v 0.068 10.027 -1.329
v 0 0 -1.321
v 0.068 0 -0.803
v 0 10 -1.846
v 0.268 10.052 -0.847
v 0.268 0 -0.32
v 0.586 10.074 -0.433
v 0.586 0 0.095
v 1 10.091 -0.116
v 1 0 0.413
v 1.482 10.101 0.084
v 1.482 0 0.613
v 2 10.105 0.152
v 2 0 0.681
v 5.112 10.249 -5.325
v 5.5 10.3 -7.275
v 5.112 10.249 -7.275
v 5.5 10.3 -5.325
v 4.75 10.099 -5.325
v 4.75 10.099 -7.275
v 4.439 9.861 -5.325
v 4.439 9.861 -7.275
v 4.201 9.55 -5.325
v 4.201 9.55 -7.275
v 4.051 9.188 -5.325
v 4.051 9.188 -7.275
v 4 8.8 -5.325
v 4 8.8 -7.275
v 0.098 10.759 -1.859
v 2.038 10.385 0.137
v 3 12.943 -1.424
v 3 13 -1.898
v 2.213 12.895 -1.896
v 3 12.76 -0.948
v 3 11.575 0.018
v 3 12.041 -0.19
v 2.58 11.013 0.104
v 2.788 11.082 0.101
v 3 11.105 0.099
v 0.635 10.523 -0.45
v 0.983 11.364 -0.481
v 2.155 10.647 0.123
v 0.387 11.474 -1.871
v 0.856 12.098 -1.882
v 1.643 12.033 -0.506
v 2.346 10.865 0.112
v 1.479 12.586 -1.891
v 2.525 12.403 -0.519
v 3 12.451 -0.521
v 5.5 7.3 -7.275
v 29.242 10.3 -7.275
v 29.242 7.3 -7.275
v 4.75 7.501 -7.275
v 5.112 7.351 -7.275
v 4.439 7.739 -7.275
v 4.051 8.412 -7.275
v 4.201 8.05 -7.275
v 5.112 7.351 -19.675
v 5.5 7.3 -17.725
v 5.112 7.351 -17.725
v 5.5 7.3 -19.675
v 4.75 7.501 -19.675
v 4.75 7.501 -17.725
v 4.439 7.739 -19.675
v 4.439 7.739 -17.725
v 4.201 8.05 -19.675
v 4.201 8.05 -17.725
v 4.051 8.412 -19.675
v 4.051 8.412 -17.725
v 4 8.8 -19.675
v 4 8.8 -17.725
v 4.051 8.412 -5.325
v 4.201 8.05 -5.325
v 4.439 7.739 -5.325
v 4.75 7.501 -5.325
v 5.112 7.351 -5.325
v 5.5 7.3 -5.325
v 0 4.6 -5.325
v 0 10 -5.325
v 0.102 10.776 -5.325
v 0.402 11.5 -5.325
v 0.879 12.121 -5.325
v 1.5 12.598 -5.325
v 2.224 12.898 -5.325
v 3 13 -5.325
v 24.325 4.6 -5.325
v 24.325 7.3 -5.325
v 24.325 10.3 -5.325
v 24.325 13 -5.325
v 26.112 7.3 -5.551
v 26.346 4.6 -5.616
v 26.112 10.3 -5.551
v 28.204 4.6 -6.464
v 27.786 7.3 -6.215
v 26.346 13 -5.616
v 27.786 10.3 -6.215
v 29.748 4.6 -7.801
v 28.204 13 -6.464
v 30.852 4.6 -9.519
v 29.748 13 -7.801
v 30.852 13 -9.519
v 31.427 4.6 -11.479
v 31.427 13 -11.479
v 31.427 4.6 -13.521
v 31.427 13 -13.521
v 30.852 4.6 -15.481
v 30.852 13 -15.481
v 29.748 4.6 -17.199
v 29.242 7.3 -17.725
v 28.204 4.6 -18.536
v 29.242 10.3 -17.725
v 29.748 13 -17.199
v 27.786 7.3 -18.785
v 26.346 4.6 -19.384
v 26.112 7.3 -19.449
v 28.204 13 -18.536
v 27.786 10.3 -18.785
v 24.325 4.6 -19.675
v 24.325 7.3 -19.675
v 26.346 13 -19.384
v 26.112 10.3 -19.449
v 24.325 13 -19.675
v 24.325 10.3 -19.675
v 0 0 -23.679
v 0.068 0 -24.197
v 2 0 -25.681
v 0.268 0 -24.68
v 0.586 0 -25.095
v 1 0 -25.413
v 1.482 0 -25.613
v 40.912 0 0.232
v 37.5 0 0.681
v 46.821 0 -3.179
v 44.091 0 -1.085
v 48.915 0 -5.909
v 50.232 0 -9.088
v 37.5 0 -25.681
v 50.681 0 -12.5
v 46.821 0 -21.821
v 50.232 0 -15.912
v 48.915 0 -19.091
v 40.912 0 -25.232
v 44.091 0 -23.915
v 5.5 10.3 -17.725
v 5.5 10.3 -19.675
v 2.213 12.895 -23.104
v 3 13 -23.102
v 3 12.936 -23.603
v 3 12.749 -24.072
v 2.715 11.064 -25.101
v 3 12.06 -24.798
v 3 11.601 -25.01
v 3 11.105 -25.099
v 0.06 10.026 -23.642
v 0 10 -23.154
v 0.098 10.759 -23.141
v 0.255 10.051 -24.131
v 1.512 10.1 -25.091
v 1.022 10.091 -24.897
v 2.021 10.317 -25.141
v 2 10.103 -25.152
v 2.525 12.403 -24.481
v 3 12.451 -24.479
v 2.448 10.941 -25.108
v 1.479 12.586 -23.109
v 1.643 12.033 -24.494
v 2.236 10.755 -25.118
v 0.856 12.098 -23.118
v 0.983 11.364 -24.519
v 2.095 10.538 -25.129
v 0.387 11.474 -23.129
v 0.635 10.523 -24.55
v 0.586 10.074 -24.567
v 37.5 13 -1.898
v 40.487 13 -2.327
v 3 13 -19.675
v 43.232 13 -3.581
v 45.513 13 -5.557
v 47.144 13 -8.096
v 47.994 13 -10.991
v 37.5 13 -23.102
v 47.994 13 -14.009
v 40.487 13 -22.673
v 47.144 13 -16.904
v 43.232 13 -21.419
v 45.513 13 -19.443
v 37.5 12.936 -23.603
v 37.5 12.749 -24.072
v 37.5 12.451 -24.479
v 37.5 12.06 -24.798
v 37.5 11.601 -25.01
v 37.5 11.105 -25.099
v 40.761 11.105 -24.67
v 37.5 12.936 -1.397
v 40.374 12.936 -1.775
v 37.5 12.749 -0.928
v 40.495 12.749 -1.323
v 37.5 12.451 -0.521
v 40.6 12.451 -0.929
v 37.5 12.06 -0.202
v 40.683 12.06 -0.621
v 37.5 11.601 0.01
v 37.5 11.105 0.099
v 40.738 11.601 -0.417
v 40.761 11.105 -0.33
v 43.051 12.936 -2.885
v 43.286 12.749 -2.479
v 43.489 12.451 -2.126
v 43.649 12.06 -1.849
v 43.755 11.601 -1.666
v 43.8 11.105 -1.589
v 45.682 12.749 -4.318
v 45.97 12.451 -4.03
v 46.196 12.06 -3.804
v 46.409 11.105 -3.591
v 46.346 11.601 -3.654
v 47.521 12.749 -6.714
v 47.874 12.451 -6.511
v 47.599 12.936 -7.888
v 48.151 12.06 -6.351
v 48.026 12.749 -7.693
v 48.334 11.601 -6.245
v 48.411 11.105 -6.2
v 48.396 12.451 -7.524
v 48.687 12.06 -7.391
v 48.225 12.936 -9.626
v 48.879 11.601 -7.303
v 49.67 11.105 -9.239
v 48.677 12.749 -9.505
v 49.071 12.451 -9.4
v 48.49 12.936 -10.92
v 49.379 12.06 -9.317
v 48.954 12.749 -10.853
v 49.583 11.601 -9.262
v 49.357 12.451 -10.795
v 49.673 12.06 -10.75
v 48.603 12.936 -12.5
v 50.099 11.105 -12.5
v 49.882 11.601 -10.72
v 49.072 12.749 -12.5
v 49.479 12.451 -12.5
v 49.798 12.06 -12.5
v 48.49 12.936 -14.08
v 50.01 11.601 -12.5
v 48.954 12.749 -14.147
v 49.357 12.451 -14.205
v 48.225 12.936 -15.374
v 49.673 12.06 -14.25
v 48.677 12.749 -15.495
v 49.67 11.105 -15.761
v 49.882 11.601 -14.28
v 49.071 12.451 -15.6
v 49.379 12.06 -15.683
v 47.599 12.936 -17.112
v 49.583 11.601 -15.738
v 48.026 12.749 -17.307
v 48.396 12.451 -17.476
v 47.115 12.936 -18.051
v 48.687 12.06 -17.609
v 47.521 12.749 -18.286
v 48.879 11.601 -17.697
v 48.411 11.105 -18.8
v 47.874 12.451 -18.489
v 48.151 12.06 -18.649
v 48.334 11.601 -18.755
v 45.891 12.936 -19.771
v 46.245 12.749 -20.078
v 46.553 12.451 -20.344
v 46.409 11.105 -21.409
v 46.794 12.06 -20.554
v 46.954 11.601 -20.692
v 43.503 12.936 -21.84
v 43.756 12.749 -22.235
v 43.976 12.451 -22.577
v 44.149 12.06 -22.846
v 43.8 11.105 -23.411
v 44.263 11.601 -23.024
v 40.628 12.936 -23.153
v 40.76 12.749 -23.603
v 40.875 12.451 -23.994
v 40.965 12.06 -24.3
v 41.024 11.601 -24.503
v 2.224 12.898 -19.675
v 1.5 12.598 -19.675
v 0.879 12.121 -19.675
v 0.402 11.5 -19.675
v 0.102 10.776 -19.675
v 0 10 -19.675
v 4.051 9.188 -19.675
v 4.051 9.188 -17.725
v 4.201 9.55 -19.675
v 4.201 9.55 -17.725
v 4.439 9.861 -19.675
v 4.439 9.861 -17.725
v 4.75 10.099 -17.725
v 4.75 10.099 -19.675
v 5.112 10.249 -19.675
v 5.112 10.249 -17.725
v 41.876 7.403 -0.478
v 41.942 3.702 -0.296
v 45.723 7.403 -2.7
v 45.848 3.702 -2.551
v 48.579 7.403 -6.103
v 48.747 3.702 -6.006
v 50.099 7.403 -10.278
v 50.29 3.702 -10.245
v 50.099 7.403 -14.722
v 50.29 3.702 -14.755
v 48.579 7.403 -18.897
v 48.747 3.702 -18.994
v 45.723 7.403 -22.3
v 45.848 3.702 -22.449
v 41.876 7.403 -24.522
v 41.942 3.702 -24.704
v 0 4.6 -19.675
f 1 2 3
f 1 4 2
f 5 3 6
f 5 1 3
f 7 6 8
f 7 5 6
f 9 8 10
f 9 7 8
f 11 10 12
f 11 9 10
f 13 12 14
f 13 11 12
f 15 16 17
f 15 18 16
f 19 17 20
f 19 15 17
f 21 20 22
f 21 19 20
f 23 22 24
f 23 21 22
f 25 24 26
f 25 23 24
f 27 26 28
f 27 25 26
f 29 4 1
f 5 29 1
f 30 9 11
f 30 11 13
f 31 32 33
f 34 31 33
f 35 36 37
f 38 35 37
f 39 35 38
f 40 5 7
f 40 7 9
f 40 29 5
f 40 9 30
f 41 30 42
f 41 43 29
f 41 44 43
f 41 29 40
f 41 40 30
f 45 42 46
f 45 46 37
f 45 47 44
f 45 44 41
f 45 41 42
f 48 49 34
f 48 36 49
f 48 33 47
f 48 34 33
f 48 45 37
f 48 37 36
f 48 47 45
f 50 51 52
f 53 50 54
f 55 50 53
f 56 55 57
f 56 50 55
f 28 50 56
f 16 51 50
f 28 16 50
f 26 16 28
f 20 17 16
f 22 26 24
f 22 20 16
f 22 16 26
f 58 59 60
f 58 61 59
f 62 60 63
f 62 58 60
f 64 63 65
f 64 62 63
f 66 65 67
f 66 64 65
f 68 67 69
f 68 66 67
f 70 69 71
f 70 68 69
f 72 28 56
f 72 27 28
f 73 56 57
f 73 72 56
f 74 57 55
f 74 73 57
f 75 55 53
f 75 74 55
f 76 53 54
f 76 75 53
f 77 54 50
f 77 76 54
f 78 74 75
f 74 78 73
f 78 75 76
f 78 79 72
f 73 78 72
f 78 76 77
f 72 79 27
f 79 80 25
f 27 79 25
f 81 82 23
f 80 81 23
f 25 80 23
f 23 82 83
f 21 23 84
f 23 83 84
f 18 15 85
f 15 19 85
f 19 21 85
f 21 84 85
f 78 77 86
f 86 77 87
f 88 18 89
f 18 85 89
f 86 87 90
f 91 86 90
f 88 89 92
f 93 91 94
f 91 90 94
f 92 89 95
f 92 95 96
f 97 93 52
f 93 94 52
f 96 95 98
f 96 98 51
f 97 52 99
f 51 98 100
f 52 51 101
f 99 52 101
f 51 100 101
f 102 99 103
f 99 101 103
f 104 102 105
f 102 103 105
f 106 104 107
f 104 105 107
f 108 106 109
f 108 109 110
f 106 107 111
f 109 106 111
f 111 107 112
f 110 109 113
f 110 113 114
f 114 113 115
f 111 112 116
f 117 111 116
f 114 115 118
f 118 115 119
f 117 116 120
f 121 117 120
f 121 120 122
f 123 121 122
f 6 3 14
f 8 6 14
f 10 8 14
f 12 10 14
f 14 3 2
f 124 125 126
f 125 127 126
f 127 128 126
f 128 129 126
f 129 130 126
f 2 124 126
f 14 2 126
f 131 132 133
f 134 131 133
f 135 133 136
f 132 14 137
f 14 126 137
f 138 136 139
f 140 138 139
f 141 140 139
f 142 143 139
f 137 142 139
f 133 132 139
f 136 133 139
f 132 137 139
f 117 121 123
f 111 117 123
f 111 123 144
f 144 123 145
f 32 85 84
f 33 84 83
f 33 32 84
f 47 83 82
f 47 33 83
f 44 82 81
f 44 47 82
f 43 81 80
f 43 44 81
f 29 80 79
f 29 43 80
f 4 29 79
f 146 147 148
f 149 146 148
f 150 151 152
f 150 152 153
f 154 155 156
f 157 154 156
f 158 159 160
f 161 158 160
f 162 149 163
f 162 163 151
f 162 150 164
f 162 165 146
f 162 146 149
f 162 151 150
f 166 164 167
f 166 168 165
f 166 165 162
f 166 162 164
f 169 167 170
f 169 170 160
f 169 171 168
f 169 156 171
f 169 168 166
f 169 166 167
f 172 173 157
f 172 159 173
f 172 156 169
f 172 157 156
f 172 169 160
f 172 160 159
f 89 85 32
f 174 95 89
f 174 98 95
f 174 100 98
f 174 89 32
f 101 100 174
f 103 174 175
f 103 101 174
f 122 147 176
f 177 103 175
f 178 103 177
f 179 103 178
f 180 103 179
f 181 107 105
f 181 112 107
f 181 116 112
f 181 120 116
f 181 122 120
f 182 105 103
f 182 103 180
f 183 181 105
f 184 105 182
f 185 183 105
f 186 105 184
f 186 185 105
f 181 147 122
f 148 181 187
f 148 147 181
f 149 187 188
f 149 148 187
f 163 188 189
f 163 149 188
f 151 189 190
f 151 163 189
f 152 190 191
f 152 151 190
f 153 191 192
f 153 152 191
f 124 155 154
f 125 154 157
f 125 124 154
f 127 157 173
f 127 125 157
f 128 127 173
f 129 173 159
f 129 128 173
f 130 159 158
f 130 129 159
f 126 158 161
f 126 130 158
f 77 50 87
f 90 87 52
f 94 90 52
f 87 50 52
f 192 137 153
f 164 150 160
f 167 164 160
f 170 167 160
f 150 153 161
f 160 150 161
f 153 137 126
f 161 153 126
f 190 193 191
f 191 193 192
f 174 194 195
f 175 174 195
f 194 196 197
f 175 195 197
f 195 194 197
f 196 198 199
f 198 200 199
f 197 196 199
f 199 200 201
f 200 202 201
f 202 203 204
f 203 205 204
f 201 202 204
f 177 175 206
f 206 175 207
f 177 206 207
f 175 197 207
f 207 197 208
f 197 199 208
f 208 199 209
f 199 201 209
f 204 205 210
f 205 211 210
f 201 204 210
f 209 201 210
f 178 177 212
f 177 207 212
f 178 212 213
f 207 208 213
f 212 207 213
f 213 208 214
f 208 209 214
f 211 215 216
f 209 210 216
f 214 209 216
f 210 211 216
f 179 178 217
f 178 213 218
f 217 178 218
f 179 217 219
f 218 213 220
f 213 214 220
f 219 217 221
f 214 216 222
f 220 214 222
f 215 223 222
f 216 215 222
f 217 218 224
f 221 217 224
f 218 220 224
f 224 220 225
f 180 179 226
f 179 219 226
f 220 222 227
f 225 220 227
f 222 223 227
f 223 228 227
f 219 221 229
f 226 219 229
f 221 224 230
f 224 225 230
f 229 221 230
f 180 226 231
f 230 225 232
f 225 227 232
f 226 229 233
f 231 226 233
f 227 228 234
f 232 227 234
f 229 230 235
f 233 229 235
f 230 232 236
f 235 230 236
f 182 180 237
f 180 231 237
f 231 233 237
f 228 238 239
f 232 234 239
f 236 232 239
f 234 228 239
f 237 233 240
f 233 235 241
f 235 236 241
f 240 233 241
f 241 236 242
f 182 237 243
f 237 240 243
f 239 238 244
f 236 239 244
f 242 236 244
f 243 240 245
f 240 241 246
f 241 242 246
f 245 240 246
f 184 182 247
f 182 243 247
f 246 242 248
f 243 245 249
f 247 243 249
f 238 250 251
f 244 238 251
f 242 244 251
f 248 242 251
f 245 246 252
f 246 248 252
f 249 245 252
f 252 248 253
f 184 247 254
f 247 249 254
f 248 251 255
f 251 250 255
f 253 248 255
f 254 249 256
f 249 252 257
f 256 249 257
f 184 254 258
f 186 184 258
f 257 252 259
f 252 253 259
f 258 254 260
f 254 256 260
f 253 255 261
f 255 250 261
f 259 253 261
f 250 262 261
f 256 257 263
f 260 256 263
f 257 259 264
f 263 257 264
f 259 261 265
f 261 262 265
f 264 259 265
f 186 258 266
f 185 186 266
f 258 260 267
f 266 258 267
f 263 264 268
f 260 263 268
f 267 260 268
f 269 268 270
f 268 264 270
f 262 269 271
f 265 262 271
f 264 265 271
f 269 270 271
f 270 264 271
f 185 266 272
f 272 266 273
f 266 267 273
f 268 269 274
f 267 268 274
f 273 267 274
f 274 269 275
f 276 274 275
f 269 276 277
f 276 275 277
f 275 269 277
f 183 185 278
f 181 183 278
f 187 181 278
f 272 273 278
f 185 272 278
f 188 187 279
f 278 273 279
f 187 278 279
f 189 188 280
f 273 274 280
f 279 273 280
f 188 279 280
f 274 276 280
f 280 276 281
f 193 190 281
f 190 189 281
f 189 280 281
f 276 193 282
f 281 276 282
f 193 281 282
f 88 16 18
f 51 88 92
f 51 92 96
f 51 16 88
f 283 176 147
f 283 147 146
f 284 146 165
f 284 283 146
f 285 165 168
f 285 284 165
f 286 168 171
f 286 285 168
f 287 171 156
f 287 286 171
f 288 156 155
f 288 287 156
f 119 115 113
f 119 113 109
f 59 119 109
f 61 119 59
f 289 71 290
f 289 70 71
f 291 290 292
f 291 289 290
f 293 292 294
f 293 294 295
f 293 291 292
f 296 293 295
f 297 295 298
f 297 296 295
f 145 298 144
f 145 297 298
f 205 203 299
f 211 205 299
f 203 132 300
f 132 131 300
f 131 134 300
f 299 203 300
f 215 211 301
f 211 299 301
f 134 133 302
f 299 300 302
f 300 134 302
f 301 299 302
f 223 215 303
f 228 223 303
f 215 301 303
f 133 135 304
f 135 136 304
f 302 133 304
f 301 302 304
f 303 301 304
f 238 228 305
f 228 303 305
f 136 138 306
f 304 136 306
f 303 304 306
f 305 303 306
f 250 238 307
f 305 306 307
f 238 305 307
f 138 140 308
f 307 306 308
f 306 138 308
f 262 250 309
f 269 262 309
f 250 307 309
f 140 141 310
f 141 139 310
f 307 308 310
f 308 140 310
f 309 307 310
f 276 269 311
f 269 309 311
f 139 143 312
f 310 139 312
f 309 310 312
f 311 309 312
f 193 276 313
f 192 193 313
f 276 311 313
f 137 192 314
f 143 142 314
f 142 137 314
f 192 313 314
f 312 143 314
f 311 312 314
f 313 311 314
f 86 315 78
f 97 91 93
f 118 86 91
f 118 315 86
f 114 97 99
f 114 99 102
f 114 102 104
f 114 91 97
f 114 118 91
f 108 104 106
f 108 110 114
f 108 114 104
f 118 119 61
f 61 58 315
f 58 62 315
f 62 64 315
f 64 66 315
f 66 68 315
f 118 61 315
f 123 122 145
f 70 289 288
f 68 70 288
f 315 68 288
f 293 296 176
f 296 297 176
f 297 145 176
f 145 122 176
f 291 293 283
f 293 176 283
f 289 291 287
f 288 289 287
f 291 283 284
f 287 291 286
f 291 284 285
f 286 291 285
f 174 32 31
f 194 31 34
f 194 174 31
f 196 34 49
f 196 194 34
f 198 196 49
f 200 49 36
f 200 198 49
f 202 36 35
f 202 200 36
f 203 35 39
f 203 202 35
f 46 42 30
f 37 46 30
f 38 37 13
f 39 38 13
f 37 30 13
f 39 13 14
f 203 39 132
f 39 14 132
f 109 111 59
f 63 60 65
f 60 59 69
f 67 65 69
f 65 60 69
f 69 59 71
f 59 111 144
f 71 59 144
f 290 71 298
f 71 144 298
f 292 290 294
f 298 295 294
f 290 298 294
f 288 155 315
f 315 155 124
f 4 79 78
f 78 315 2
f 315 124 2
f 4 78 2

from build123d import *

# Parameters (mm, degrees)
BOSS_EXTRUDE1_DEPTH = 13
CUT_EXTRUDE1_DEPTH  = 8.4
BOSS_EXTRUDE3_START = 5.7
BOSS_EXTRUDE3_DEPTH = 3
FILLET1_R           = 1.5
DRAFT2_ANGLE        = 3
FILLET2_R           = 3
FILLET3_R           = 2


with BuildPart() as part:
    # Sketch1 → Boss-Extrude1 (new body)
    with BuildSketch(Plane(origin=(0, 0, 0), x_dir=(1, 0, 0), z_dir=(0, 1, 0))):
        with BuildLine():
            Line((0, 0), (37.5, 0))
            ThreePointArc((37.5, 0), (50, 12.5), (37.5, 25))
            Line((37.5, 25), (0, 25))
            Line((0, 25), (0, 0))
        make_face()
    extrude(amount=BOSS_EXTRUDE1_DEPTH)

    # Sketch2 → Cut-Extrude1 (cut)
    with BuildSketch(Plane(origin=(0, 13, 0), x_dir=(1, 0, 0), z_dir=(0, 1, 0))):
        with BuildLine():
            Line((24.325, 19.675), (0, 19.675))
            Line((0, 19.675), (0, 5.325))
            Line((0, 5.325), (24.325, 5.325))
            ThreePointArc((24.325, 5.325), (31.5, 12.5), (24.325, 19.675))
        make_face()
    extrude(amount=-CUT_EXTRUDE1_DEPTH, mode=Mode.SUBTRACT)

    # Sketch3 → Boss-Extrude3 (add)
    with BuildSketch(Plane(origin=(0, 4.6, 0), x_dir=(1, 0, 0), z_dir=(0, 1, 0)).offset(BOSS_EXTRUDE3_START)):
        with BuildLine():
            Line((4, 5.325), (24.325, 5.325))
            ThreePointArc((24.325, 5.325), (26.969924385, 5.83029236), (29.242316341, 7.275))
            Line((29.242316341, 7.275), (4, 7.275))
            Line((4, 7.275), (4, 5.325))
        make_face()
        with BuildLine():
            Line((4, 19.675), (24.325, 19.675))
            ThreePointArc((24.325, 19.675), (26.969924385, 19.16970764), (29.242316341, 17.725))
            Line((29.242316341, 17.725), (4, 17.725))
            Line((4, 17.725), (4, 19.675))
        make_face()
    extrude(amount=-BOSS_EXTRUDE3_DEPTH)

    # Fillet1
    fillet1_edges = [part.edges().sort_by_distance(p)[0] for p in [
        (4, 7.3, -6.3),
        (4, 10.3, -6.3),
        (4, 7.3, -18.7),
        (4, 10.3, -18.7),
    ]]
    fillet(fillet1_edges, radius=FILLET1_R - 0.0001)  # a hair under: the kernel refuses the full size

    # Draft2
    draft2_faces = [part.faces().sort_by_distance(p)[0] for p in [
        (18.75, 6.5, -25),
        (50, 6.5, -12.5),
        (18.75, 6.5, 0),
    ]]
    draft(draft2_faces, Plane(origin=(37.5, 13, -12.5), x_dir=(0, 0, 1), z_dir=(0, 1, 0)), DRAFT2_ANGLE)

    # Fillet2
    fillet2_edges = [part.edges().sort_by_distance(p)[0] for p in [
        (0, 13, -2.6625),
        (0, 13, -22.3375),
    ]]
    fillet(fillet2_edges, radius=FILLET2_R)

    # Fillet3
    fillet3_edges = [part.edges().sort_by_distance(p)[0] for p in [
        (50, 13, -12.5),
        (20.25, 13, -25),
        (20.25, 13, 0),
        (0, 5, -25.419262234),
        (0, 5, 0.419262234),
        (0.877952484, 12.120592922, -25.046087772),
        (0.877952484, 12.120592922, 0.046087772),
    ]]
    fillet(fillet3_edges, radius=FILLET3_R)


solid = part.part
